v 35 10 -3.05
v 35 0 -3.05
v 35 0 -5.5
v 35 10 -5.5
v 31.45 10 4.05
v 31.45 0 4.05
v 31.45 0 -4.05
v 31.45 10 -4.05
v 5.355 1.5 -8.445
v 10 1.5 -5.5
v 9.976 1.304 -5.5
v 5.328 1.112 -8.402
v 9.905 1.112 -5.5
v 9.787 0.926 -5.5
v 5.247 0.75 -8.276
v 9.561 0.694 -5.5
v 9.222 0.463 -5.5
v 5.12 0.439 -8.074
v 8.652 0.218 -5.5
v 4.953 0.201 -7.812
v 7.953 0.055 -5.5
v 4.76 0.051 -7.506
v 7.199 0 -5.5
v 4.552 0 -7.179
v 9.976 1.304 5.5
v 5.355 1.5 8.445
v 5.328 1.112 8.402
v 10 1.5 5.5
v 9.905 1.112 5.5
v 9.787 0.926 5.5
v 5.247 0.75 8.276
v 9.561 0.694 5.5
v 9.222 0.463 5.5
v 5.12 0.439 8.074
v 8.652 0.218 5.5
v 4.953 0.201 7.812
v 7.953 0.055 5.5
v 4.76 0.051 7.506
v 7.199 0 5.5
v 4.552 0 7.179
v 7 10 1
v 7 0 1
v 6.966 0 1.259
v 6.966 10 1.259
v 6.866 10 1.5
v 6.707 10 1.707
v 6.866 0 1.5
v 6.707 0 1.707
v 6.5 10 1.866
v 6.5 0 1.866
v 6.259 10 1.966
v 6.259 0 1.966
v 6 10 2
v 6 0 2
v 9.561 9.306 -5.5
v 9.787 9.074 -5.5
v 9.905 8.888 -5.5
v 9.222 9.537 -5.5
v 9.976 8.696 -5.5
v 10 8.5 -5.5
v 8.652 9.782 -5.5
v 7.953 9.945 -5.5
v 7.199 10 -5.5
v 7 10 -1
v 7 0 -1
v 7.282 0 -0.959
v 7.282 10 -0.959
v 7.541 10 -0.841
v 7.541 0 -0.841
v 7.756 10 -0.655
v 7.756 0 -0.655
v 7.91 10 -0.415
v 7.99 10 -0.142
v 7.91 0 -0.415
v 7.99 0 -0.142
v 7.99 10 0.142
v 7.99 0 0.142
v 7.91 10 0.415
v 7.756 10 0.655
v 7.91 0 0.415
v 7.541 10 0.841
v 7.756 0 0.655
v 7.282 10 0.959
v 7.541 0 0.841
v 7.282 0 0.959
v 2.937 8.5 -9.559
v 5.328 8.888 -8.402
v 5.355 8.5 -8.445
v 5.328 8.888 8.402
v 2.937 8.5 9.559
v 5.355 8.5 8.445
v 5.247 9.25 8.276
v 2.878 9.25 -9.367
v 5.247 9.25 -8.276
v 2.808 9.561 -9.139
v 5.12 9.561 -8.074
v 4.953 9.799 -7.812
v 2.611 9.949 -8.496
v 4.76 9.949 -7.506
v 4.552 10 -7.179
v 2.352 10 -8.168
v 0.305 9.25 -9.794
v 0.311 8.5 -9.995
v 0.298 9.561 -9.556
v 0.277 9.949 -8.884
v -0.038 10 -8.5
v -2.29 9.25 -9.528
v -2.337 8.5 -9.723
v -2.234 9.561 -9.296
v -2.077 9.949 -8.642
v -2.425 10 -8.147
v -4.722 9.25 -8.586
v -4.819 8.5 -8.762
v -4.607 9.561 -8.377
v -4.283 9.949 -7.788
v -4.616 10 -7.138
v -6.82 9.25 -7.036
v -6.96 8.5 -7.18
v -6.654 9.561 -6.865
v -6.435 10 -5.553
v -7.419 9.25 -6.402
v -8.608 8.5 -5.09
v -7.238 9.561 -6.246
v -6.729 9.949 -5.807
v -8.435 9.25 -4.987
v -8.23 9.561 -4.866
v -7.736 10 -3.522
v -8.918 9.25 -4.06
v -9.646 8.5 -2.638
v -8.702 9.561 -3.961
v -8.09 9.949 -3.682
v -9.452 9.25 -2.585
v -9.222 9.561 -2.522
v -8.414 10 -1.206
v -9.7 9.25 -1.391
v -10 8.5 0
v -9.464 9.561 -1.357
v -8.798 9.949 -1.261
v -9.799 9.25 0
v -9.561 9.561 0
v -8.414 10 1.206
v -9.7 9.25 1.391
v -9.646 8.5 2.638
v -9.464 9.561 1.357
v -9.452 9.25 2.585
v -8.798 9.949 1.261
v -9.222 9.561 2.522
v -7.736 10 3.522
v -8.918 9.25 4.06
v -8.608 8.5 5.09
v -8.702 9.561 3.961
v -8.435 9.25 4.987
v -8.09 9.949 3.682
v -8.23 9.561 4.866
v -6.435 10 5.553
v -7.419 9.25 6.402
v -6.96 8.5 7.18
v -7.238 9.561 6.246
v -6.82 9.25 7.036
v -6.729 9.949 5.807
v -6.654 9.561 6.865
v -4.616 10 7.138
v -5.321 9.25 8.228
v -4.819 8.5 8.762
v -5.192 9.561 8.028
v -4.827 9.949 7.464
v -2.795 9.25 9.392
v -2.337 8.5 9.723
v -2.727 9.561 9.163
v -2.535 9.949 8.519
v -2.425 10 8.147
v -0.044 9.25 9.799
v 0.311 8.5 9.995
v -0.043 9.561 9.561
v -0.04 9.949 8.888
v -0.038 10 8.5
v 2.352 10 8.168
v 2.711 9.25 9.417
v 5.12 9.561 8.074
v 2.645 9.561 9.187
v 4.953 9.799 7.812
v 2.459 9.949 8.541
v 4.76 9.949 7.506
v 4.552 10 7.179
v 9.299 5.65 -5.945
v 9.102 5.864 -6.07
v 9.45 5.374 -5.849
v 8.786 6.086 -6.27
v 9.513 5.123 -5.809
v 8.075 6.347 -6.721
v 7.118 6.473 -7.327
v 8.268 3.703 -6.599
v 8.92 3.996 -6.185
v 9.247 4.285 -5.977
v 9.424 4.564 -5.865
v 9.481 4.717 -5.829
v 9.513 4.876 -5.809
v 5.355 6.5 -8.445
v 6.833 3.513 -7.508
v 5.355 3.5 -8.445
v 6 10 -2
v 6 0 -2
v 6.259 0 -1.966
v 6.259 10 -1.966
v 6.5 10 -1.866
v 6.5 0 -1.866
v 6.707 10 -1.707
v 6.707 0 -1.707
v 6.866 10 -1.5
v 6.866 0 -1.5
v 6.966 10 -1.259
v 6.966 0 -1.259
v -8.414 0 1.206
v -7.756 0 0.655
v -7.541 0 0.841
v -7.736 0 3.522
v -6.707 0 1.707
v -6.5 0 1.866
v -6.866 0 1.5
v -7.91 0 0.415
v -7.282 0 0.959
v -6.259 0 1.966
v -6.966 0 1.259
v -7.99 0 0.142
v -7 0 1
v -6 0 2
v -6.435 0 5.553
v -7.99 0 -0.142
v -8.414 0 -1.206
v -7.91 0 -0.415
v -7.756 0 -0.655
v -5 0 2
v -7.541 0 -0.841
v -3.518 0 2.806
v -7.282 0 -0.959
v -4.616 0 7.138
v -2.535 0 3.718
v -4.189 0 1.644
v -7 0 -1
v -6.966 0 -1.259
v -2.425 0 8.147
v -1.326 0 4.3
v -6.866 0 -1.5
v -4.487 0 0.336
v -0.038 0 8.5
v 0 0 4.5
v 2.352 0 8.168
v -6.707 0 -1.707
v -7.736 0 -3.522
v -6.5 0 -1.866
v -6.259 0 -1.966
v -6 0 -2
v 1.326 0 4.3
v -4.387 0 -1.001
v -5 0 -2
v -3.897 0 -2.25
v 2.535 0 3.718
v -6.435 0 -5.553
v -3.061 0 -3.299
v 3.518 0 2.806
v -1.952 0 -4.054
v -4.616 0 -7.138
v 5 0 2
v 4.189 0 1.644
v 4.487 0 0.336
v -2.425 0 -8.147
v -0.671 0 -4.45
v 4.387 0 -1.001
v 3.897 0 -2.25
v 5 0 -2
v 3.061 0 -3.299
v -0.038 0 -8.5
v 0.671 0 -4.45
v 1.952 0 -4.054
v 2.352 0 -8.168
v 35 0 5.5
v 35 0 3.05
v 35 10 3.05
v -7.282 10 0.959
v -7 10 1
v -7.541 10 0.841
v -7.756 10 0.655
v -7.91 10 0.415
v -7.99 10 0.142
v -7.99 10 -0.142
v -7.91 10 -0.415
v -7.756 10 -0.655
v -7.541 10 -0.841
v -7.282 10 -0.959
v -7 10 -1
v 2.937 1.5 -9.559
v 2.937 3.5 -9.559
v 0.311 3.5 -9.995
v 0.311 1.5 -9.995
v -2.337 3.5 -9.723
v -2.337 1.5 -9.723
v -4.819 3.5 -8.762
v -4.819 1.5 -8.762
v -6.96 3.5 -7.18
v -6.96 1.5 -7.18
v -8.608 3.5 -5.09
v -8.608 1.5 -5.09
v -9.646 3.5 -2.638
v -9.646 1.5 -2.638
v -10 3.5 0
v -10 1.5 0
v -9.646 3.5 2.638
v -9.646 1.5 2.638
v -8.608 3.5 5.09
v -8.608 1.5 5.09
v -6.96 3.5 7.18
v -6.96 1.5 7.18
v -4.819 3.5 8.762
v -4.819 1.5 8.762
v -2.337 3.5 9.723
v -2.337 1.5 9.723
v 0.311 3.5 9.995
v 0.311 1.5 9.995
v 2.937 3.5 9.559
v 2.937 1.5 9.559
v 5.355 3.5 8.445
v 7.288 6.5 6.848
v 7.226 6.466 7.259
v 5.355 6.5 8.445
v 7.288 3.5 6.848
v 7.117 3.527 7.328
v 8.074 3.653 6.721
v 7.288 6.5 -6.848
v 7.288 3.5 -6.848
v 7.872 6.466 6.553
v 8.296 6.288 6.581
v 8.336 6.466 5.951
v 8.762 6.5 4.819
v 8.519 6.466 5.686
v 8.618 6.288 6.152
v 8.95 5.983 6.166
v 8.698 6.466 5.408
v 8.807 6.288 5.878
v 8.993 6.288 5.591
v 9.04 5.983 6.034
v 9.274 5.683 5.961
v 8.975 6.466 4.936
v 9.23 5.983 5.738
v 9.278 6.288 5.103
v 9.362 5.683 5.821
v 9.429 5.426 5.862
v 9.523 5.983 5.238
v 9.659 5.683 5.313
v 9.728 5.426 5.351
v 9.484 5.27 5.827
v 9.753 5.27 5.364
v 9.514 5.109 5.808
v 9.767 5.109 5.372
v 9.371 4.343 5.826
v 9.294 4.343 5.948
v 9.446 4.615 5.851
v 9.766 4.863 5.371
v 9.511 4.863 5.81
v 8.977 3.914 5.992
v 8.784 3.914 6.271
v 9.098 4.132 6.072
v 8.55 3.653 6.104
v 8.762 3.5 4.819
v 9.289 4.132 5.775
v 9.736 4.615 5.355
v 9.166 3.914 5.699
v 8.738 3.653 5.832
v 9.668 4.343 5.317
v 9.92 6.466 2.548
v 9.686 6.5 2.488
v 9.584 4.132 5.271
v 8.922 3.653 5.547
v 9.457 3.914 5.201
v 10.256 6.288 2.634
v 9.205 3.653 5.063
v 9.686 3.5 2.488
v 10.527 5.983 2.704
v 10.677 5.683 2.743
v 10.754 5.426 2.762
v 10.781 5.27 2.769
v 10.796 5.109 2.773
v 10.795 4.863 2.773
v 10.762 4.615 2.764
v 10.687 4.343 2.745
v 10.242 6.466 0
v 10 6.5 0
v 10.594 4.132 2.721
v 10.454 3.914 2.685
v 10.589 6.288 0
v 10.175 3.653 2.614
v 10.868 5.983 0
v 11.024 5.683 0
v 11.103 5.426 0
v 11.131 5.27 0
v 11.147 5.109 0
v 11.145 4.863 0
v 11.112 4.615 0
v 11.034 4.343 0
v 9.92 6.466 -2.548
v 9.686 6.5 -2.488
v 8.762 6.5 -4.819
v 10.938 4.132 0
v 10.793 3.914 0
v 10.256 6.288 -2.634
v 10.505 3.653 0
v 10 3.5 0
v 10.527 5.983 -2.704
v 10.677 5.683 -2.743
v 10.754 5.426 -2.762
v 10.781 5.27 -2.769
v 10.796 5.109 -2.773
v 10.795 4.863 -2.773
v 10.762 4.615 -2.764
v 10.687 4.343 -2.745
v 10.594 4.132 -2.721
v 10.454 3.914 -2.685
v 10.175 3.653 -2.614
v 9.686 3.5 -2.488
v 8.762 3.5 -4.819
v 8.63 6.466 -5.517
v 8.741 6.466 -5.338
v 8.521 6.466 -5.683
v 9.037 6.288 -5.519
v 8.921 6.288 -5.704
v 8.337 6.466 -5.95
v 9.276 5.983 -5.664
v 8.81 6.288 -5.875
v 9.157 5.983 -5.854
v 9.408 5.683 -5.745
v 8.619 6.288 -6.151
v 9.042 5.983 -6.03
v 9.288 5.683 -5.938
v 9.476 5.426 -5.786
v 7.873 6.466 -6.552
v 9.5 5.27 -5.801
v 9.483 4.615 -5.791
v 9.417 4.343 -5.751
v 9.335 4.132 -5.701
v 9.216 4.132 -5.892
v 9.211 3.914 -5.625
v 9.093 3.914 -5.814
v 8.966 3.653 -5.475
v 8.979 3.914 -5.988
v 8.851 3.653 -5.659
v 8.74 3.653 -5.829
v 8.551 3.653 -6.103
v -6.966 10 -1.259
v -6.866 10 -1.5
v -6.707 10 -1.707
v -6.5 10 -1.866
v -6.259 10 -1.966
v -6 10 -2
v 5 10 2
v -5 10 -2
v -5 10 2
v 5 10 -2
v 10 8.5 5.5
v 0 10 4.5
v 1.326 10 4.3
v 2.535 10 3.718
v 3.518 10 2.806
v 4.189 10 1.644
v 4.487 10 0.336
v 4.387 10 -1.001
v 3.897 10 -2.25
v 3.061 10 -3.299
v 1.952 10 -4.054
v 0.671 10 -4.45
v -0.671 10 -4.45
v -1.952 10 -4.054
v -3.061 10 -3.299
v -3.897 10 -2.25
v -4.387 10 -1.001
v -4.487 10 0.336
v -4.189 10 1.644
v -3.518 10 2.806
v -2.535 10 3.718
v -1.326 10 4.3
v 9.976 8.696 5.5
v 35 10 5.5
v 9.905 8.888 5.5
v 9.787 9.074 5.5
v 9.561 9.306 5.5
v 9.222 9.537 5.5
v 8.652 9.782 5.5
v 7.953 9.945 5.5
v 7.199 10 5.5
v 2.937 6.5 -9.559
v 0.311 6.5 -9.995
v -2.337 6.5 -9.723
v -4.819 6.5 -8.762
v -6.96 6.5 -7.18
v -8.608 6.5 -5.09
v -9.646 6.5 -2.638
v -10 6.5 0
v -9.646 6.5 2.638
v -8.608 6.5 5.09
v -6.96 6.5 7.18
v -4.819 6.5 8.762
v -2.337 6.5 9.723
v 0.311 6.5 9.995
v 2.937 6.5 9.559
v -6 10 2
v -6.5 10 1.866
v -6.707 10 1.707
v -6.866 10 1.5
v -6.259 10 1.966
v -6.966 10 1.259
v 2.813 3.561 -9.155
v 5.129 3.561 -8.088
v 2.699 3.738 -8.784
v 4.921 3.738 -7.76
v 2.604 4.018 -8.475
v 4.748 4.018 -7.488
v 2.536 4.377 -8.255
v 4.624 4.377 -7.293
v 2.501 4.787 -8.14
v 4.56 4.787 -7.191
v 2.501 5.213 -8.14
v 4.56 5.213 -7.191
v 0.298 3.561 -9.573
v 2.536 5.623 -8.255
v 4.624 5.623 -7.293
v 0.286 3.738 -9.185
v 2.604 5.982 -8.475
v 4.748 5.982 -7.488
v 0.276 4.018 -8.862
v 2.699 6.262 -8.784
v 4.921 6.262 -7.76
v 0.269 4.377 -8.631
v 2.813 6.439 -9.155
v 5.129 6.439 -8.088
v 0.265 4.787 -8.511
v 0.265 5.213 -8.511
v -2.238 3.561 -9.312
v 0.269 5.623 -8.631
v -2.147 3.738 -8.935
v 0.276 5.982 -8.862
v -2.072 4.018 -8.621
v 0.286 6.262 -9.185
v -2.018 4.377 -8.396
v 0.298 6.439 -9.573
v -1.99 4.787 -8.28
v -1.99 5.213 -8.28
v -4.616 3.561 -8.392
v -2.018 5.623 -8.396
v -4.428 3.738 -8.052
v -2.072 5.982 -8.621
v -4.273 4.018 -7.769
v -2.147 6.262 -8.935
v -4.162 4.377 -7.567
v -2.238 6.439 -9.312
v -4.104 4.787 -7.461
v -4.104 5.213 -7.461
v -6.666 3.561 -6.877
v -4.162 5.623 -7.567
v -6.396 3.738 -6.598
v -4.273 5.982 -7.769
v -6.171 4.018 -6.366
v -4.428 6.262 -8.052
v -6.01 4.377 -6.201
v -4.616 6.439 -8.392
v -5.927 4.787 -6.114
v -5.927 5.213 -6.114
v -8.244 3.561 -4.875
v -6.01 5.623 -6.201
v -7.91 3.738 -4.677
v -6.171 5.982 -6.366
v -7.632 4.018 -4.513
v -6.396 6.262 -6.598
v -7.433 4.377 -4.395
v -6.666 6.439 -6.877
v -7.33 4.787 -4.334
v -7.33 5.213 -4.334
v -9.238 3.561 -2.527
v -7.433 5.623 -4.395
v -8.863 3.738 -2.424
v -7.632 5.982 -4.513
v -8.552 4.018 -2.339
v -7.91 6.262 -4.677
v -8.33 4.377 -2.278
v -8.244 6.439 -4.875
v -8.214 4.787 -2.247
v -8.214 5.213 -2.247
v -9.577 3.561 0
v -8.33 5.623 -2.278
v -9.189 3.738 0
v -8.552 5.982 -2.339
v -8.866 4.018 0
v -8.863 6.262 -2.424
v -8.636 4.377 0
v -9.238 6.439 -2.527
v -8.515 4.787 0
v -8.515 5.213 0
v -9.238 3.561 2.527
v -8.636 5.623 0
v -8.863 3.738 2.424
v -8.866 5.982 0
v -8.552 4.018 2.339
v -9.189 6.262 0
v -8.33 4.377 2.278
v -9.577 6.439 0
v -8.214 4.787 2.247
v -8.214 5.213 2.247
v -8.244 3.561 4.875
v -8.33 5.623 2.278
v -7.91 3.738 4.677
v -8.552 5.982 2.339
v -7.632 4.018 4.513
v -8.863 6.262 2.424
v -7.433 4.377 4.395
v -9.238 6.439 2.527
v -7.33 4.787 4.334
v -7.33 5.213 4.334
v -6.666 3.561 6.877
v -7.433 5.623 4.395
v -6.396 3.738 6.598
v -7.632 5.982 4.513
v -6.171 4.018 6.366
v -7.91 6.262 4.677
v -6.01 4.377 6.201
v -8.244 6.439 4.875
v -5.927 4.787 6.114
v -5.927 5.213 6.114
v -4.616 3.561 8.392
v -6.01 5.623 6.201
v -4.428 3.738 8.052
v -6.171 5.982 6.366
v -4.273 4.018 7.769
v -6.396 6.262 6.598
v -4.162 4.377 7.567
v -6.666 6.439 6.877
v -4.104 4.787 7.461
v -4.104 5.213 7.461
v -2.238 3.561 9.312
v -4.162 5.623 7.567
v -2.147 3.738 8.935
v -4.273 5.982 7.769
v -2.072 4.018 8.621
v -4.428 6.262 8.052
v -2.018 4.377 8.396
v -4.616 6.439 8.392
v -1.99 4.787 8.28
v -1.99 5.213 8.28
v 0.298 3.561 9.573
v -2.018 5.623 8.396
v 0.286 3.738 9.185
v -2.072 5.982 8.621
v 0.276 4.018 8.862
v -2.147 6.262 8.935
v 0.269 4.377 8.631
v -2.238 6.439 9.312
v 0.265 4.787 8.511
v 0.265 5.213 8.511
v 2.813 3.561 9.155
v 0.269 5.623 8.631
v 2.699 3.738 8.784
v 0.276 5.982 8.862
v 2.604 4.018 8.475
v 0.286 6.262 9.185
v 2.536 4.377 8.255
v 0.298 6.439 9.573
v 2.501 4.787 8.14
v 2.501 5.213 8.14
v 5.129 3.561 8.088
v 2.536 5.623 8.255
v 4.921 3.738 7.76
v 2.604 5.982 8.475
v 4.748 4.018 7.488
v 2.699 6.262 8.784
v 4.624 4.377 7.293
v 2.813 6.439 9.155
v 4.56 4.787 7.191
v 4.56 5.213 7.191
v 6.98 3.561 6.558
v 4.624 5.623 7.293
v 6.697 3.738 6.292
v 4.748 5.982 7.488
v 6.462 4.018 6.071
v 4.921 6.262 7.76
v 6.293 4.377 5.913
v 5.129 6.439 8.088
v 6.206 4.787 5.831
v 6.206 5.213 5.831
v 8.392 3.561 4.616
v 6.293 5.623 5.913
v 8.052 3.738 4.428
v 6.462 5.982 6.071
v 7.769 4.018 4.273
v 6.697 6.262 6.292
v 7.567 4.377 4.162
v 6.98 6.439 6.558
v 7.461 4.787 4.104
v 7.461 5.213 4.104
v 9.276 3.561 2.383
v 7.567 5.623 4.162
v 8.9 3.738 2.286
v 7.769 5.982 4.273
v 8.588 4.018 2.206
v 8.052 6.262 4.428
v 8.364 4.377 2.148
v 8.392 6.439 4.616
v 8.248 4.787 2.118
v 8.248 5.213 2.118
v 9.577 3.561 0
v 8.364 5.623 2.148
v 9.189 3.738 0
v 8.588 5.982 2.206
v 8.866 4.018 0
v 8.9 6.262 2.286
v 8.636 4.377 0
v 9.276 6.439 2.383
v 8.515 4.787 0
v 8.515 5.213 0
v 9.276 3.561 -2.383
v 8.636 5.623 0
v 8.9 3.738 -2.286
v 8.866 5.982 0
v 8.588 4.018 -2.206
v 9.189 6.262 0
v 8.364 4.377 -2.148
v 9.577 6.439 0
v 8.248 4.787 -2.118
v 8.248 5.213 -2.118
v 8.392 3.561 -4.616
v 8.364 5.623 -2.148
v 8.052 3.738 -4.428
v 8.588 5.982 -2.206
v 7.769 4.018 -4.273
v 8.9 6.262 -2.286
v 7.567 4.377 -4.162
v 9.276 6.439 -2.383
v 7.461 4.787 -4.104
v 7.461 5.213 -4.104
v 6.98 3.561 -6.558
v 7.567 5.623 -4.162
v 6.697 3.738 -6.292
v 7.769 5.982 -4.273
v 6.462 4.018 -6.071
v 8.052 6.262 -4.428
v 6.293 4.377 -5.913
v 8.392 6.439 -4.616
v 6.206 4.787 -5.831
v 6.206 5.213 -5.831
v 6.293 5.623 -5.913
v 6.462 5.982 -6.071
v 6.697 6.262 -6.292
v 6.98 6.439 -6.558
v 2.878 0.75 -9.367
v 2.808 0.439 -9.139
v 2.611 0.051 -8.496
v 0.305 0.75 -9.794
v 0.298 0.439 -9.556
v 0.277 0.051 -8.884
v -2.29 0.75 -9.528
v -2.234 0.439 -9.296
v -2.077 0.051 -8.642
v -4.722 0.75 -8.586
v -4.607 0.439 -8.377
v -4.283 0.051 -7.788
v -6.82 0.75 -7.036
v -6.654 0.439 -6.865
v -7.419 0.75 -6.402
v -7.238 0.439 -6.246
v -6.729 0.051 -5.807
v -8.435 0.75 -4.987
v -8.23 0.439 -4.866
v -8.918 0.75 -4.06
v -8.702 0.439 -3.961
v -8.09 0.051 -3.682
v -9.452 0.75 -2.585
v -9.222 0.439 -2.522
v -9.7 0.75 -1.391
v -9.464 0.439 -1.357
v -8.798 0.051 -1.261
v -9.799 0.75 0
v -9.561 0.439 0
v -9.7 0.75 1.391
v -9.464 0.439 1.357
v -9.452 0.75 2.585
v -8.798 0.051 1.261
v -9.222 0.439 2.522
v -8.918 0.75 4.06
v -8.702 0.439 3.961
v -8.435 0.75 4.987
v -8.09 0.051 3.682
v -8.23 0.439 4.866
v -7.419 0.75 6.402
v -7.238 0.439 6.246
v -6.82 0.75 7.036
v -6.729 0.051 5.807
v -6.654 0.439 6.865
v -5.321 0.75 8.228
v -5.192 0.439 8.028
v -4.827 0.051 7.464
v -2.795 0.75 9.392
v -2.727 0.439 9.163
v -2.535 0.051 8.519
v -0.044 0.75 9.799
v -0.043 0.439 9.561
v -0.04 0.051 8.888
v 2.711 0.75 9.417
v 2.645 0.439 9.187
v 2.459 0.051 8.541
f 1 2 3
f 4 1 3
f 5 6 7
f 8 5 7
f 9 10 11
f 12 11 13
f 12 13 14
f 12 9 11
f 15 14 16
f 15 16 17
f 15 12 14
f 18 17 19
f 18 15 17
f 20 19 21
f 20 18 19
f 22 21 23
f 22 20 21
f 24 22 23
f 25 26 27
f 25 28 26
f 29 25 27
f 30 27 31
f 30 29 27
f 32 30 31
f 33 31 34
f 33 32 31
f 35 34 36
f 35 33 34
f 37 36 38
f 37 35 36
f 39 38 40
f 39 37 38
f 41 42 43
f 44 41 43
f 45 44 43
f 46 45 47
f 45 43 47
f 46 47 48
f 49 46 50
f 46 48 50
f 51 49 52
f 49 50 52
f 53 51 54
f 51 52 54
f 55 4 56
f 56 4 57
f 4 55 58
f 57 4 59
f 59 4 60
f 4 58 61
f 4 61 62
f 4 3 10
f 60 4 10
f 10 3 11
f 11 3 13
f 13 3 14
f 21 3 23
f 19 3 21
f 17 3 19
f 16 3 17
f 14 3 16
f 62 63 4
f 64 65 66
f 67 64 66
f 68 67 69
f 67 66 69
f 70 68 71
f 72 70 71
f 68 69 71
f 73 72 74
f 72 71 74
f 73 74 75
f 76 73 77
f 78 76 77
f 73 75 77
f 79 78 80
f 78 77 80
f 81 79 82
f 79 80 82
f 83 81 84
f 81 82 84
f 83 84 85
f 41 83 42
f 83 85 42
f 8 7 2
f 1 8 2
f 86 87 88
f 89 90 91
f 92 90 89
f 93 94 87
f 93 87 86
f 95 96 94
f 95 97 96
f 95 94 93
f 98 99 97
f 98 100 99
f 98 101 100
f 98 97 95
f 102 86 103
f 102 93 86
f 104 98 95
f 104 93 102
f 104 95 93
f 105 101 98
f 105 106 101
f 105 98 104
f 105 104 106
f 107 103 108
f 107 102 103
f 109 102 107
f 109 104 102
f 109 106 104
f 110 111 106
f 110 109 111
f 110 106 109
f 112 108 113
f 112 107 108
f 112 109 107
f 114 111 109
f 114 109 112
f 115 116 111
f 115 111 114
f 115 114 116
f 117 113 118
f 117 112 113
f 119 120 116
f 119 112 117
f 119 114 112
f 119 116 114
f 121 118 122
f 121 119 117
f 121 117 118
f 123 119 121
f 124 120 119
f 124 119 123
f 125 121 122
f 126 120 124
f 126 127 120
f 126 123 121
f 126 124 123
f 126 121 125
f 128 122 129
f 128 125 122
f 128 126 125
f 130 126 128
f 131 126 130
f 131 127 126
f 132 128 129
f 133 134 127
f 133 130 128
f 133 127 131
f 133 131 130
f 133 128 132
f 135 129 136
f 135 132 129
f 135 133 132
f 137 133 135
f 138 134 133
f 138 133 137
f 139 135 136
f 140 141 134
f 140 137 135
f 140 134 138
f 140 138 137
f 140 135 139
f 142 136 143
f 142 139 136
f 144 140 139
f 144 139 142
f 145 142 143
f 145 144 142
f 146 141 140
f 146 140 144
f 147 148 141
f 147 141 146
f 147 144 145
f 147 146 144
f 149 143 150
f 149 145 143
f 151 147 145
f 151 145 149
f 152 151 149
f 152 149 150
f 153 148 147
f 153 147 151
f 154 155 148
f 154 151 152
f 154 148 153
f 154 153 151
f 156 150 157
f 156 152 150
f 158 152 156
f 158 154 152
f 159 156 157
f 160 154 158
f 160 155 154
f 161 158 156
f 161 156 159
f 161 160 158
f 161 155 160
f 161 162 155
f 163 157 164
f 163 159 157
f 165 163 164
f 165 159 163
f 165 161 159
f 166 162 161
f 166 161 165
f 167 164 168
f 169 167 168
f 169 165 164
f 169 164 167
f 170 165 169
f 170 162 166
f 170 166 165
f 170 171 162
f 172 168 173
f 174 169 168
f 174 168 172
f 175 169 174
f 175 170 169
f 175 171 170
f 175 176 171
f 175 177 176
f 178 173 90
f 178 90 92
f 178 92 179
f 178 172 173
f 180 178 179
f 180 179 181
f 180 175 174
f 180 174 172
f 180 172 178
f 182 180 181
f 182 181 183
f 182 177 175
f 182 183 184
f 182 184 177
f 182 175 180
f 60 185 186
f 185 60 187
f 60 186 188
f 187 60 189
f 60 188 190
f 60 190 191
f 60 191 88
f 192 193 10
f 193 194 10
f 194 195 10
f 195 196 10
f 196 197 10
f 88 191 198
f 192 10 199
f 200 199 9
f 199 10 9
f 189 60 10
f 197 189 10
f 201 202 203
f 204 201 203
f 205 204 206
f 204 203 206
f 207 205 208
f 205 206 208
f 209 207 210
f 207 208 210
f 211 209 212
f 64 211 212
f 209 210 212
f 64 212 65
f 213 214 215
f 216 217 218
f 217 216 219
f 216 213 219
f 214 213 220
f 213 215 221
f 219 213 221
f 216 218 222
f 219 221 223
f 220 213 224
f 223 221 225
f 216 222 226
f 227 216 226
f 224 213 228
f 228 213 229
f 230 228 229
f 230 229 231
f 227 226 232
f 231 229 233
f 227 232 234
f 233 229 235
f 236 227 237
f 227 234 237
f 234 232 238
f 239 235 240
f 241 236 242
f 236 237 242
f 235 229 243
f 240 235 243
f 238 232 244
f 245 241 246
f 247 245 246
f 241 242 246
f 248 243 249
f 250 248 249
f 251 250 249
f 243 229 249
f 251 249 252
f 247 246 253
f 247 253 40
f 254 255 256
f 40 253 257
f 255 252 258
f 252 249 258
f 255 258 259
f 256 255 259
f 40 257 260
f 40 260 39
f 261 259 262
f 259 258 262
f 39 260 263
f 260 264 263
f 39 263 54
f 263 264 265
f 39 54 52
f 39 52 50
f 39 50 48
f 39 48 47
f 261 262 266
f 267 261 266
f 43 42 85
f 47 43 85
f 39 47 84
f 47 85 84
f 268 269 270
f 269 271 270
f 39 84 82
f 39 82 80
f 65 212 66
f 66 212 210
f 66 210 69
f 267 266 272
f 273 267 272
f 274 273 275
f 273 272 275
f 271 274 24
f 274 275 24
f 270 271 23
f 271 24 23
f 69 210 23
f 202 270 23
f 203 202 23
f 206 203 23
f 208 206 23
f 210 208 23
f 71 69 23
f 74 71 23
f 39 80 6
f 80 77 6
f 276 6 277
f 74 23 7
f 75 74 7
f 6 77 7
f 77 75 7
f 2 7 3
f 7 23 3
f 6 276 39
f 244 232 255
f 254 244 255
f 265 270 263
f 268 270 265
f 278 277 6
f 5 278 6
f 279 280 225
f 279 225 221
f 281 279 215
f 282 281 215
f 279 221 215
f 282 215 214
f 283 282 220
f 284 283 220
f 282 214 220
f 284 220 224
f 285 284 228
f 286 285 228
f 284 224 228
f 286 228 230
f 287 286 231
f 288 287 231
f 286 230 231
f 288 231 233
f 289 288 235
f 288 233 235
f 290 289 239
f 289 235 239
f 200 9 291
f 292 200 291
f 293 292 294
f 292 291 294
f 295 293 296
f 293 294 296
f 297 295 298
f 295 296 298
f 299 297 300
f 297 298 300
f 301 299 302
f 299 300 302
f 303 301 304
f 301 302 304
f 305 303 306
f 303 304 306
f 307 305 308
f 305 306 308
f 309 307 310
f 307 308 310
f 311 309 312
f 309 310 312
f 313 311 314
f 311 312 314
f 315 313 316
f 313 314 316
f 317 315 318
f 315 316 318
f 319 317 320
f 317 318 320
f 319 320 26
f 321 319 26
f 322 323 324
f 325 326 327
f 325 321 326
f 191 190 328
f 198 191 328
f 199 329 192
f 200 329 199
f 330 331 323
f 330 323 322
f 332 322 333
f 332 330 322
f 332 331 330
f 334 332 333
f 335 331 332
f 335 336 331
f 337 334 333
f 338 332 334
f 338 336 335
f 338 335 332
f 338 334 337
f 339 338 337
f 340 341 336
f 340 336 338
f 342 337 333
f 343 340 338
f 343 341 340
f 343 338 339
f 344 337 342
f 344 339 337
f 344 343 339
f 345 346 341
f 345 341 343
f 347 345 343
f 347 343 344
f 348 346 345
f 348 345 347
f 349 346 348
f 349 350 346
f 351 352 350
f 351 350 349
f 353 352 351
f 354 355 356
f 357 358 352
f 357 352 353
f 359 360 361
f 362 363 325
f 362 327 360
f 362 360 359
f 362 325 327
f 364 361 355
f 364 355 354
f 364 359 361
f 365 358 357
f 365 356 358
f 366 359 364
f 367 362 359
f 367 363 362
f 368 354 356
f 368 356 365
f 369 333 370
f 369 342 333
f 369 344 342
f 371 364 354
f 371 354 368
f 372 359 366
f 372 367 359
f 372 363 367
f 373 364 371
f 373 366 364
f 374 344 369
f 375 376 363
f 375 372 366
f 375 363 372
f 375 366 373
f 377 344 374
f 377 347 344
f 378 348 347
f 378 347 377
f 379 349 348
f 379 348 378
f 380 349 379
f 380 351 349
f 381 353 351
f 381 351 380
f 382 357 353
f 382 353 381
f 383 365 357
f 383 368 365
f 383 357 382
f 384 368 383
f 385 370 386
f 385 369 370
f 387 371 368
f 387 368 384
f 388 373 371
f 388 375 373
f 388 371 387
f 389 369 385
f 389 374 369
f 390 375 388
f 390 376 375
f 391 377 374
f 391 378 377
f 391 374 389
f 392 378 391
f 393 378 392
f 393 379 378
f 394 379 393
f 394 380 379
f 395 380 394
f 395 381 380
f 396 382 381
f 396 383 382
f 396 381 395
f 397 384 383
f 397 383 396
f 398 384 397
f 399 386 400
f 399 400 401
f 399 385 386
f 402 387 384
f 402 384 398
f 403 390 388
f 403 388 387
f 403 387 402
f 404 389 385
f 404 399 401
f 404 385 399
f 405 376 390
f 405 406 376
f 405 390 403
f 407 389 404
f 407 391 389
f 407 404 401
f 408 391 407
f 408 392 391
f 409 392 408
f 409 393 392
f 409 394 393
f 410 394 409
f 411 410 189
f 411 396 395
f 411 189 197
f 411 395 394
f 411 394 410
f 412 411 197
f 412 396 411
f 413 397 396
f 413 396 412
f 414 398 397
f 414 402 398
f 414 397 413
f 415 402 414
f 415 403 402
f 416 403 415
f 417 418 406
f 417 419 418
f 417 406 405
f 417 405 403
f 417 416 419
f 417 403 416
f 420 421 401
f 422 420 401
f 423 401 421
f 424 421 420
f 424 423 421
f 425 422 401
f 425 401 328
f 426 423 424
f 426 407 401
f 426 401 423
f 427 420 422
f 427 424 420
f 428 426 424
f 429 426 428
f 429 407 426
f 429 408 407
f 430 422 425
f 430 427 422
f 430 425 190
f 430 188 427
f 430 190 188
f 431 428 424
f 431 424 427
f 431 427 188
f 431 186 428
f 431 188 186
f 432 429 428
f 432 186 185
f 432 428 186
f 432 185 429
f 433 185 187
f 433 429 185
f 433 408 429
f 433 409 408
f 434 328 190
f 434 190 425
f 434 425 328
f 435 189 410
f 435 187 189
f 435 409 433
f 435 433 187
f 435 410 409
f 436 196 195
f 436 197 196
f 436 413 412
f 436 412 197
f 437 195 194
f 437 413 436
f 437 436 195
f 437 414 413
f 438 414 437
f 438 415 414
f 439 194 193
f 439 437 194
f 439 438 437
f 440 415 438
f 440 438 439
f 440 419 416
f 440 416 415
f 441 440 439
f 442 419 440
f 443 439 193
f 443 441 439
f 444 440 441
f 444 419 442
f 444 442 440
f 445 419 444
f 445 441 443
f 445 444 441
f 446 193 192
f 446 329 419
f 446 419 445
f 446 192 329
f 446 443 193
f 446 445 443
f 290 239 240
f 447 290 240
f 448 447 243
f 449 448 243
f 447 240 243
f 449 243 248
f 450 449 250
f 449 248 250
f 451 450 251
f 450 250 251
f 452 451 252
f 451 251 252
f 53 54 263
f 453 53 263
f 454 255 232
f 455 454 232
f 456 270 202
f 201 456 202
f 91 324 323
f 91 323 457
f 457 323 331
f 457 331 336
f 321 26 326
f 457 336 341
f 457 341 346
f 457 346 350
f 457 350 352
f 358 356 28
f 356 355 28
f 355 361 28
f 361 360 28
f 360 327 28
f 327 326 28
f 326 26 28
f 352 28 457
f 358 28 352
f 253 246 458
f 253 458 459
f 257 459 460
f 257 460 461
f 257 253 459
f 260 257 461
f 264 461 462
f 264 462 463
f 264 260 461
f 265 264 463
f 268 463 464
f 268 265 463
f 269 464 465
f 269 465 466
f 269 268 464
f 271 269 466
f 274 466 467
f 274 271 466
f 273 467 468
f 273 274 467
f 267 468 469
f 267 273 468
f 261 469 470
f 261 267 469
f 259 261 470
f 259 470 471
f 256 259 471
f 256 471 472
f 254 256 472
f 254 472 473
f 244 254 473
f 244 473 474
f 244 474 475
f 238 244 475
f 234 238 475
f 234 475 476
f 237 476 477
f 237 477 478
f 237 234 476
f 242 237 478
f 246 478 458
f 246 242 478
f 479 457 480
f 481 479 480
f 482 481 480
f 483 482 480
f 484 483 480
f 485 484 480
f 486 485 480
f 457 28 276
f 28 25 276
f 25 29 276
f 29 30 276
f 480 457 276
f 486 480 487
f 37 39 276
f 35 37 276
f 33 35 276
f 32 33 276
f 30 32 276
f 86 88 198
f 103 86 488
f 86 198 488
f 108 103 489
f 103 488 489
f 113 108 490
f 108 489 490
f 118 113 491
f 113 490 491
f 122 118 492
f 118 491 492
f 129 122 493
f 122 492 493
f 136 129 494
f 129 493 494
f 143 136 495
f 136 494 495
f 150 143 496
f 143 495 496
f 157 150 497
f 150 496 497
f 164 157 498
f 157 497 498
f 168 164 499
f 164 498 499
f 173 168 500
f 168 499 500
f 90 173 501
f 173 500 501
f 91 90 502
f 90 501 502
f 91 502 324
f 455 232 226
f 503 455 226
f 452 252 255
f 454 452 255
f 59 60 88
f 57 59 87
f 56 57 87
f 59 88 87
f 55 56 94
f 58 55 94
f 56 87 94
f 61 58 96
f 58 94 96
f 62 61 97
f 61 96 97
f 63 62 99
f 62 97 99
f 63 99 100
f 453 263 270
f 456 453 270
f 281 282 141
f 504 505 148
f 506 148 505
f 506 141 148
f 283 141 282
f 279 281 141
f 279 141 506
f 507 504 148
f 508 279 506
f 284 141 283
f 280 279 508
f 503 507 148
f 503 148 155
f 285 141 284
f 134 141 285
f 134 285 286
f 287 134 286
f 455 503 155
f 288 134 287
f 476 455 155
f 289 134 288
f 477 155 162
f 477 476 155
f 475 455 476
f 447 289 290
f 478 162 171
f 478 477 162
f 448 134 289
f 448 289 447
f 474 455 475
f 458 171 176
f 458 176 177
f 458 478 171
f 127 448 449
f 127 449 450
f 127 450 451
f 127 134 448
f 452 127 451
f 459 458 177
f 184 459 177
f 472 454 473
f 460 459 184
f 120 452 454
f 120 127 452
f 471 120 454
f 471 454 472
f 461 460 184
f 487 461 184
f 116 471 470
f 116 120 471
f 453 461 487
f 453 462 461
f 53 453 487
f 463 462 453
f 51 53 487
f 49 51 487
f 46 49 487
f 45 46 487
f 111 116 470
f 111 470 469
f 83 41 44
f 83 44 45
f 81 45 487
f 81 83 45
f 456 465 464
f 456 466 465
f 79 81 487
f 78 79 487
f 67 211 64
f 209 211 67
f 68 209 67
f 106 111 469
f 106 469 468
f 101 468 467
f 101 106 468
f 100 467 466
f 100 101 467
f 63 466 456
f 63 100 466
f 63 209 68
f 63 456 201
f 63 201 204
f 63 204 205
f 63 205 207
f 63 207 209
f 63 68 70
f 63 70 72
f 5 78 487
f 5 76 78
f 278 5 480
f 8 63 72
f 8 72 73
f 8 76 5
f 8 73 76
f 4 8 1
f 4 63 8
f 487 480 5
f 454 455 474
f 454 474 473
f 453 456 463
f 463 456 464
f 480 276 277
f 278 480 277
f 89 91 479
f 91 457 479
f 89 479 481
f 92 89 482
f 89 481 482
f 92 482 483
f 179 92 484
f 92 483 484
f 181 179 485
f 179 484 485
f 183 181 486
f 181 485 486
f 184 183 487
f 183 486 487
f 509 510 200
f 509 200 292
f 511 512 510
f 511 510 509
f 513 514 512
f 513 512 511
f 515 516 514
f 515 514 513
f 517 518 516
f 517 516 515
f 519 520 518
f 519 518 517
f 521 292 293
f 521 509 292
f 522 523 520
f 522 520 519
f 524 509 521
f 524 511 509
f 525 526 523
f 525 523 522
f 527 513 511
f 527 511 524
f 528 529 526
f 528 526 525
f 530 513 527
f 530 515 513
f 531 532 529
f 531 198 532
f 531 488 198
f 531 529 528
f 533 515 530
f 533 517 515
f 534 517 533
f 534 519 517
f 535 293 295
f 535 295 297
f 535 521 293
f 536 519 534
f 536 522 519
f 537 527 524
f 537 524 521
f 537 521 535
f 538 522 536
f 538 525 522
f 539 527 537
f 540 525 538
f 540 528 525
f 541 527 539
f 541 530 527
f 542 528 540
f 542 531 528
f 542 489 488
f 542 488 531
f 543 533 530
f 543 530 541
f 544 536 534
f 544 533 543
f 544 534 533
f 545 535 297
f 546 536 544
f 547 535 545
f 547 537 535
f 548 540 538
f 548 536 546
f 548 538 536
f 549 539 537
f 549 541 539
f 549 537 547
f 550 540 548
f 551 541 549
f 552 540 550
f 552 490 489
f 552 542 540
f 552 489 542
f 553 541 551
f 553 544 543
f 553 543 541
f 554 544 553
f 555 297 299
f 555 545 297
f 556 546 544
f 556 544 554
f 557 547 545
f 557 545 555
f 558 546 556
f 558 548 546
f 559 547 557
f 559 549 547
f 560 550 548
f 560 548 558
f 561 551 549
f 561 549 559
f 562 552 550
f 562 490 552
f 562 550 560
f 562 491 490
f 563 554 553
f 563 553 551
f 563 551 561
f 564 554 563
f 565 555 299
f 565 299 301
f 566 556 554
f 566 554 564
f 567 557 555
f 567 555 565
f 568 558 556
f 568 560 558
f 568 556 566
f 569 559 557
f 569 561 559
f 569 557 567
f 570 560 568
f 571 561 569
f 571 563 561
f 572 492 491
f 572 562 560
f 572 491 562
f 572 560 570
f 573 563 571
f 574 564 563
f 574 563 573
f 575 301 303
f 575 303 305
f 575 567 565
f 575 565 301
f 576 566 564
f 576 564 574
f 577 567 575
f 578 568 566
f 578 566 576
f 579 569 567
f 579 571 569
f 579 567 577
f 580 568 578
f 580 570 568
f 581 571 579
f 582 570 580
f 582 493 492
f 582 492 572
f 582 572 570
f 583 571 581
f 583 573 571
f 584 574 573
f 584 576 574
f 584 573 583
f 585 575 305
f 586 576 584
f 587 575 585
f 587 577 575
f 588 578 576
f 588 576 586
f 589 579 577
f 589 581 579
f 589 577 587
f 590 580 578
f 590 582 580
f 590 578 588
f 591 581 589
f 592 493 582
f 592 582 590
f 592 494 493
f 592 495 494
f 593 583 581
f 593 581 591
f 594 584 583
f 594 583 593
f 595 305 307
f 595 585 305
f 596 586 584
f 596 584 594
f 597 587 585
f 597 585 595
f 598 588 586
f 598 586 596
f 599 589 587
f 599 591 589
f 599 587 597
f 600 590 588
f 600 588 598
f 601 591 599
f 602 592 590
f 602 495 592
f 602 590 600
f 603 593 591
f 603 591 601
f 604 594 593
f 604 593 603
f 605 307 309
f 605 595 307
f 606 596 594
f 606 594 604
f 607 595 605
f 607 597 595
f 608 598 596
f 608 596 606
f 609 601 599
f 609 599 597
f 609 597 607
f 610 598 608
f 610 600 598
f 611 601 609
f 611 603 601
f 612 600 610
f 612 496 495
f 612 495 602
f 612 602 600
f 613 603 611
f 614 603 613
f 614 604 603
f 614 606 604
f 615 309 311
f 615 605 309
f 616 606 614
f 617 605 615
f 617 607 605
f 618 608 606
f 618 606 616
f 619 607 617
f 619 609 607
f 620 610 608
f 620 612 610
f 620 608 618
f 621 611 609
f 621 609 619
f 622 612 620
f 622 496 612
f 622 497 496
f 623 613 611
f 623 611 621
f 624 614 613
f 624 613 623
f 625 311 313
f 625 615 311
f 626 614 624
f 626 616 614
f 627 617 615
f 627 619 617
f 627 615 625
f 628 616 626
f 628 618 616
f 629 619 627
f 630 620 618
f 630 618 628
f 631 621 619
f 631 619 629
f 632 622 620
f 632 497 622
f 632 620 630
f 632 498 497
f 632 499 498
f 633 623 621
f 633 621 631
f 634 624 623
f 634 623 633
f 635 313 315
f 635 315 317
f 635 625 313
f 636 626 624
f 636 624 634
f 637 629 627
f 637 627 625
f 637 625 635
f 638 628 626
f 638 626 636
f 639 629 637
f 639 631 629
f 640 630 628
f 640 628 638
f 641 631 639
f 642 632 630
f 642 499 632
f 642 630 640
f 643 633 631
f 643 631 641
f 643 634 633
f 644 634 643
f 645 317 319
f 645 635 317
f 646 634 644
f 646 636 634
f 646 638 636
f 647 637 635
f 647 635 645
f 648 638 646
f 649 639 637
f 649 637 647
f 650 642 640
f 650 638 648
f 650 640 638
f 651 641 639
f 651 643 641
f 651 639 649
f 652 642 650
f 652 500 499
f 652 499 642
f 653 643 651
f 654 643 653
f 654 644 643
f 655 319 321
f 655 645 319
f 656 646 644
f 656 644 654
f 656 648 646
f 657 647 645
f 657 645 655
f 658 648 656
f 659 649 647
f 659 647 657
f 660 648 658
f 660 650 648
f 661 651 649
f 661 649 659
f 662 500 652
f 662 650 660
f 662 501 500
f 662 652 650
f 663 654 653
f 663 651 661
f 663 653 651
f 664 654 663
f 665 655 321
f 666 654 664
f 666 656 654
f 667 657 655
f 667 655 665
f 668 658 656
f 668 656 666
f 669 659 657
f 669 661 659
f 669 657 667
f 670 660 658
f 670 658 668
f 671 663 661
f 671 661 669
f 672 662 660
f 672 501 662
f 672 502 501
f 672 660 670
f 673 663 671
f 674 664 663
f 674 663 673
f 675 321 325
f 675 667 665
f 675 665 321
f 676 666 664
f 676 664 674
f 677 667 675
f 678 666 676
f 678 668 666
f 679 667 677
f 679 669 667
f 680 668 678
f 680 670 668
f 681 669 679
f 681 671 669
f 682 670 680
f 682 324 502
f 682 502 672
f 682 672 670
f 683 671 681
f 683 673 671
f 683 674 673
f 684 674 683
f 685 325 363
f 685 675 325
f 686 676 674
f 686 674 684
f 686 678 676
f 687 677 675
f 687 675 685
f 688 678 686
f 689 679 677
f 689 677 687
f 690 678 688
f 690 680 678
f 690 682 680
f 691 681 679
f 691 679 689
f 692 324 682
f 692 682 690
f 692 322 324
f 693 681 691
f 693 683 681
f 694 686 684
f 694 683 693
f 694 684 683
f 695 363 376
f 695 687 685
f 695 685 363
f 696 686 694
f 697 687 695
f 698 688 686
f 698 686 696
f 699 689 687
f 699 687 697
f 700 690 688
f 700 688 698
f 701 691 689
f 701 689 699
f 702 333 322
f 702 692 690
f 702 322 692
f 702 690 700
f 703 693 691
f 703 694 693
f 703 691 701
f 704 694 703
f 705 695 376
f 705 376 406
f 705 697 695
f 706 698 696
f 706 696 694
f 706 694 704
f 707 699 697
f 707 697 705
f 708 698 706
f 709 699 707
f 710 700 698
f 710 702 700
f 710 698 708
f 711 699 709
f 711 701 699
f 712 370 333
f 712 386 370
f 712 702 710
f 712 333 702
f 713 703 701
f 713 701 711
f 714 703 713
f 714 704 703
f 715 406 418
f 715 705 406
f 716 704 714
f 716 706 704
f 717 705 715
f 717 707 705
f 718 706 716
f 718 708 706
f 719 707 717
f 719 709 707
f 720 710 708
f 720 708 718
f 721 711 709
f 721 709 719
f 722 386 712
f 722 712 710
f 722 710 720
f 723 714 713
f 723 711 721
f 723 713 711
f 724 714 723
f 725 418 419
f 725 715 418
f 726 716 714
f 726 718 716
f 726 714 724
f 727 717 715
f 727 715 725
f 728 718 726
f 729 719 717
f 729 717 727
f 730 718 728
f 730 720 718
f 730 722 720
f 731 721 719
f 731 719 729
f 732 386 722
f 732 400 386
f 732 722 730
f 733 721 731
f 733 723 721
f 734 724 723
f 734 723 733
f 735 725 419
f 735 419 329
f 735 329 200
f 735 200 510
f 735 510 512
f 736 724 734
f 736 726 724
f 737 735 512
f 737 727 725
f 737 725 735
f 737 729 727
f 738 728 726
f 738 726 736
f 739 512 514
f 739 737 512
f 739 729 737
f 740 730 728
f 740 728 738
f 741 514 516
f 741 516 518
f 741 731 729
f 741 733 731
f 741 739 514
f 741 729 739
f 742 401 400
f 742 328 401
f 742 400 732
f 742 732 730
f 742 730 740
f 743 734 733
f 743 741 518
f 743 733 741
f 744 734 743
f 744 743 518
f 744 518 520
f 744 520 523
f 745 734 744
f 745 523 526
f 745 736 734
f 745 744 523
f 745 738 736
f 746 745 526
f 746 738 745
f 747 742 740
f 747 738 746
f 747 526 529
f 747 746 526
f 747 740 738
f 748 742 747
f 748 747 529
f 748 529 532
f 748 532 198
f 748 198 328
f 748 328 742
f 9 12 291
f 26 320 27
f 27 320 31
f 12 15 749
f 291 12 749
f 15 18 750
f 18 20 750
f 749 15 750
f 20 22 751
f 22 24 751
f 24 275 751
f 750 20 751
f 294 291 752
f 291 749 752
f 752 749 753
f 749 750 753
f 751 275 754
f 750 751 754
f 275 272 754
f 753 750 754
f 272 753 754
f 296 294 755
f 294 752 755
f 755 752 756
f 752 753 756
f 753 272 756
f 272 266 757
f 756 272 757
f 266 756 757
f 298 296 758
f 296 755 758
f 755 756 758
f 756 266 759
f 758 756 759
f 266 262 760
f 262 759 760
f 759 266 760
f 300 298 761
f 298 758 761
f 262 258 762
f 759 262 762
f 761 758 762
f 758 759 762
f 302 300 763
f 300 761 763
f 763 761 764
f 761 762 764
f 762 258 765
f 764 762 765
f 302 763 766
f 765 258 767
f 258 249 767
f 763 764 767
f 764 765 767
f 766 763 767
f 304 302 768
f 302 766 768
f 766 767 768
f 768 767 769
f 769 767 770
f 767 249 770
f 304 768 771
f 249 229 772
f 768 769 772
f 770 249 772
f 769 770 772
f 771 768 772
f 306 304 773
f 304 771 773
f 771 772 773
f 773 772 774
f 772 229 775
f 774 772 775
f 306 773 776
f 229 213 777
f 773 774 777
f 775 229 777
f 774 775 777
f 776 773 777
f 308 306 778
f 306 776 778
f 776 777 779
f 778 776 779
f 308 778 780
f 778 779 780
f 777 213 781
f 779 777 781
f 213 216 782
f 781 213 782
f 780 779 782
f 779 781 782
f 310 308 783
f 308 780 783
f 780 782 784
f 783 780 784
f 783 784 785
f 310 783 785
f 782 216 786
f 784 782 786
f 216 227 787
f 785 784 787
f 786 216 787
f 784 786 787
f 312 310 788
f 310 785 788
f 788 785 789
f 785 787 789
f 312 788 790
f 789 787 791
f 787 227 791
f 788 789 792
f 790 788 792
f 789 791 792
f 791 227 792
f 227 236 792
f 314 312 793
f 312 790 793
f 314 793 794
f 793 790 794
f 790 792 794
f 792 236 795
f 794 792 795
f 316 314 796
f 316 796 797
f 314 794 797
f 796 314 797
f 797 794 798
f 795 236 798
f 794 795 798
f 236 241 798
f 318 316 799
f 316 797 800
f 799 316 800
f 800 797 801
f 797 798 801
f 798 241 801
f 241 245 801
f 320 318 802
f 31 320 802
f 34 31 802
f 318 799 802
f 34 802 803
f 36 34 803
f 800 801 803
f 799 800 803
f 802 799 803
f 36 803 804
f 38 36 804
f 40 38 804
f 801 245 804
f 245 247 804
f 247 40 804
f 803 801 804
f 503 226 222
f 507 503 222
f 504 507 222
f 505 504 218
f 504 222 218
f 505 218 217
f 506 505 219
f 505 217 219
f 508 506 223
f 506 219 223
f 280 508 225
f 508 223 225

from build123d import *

# Parameters (mm, degrees)
SKETCH1_R           = 4.5
BOSS_EXTRUDE2_DEPTH = 10
FILLET2_R           = 1.5


with BuildPart() as part:
    # Sketch1 → Boss-Extrude2 (new body)
    with BuildSketch(Plane(origin=(0, 0, 0), x_dir=(1, 0, 0), z_dir=(0, 1, 0))):
        with BuildLine():
            Line((35, 5.500000000000003), (10, 5.500000000000003))
            Line((10, 5.500000000000003), (5.355086372360837, 8.445297504798466))
            ThreePointArc((5.355086372360837, 8.445297504798466), (-10, 1.11e-14), (5.355086372360817, -8.445297504798482))
            Line((5.355086372360817, -8.445297504798482), (10, -5.499999999999997))
            Line((10, -5.499999999999997), (34.99999999999999, -5.499999999999997))
            Line((34.99999999999999, -5.499999999999997), (35, -3.05))
            Line((35, -3.05), (31.449999999999992, -4.050000000000006))
            Line((31.449999999999992, -4.050000000000006), (31.450000000000006, 4.049999999999974))
            Line((31.450000000000006, 4.049999999999973), (35, 3.05))
            Line((35, 3.05), (35, 5.500000000000003))
        make_face()
        with BuildLine():
            Line((-5, 2), (-4.999999999999999, -2))
            Line((-4.999999999999999, -2), (-5.999999999999992, -2))
            ThreePointArc((-5.999999999999992, -1.9999999999999998), (-6.707106781186546, -1.7071067811865475), (-6.999999999999999, -0.9999999999999932))
            ThreePointArc((-6.999999999999999, -1.0000000000000002), (-7.999999999999999, -7.6e-16), (-7, 0.9999999999999993))
            ThreePointArc((-7, 0.9999999999999923), (-6.707106781186547, 1.707106781186547), (-5.999999999999993, 2))
            Line((-5.999999999999993, 1.9999999999999996), (-5, 2))
        make_face(mode=Mode.SUBTRACT)
        with Locations(Location((0, 0, 0), (0, 0, 270))):
            Circle(SKETCH1_R, mode=Mode.SUBTRACT)
        with BuildLine():
            Line((4.999999999999999, -2), (5, 2))
            Line((5, 2), (5.999999999999993, 1.9999999999999996))
            ThreePointArc((5.999999999999993, 1.9999999999999998), (6.707106781186548, 1.707106781186547), (7, 0.9999999999999923))
            ThreePointArc((7, 0.9999999999999993), (7.707106781186547, 0.7071067811865467), (7.999999999999999, -4.3e-16))
            ThreePointArc((7.999999999999999, -6.8e-16), (7.707106781186546, -0.707106781186548), (6.999999999999999, -1.0000000000000002))
            ThreePointArc((6.999999999999999, -0.9999999999999932), (6.707106781186546, -1.7071067811865475), (5.999999999999992, -1.9999999999999998))
            Line((5.999999999999992, -2), (4.999999999999999, -2))
        make_face(mode=Mode.SUBTRACT)
    extrude(amount=BOSS_EXTRUDE2_DEPTH)

    # Sketch4 → Cut-Revolve3 (revolve, cut)
    with BuildSketch(Plane(origin=(-6.666818896321271, 16.53530046448365, 0), x_dir=(0, 1, 0), z_dir=(0, 0, 1)), mode=Mode.PRIVATE) as cut_revolve3_sk:
        with BuildLine():
            ThreePointArc((-13.035300464483651, 3.333181103678728), (-11.535300464483651, 1.833181103678728), (-10.035300464483651, 3.333181103678728))
            add(Edge.make_bspline(
                [(-10.035300464483651, 3.333181103678728), (-10.035300464483651, 4.483181103678728), (-11.535300464483651, 4.483181103678728), (-13.035300464483651, 4.483181103678727), (-13.035300464483651, 3.333181103678728)],
                knots=[0, 0, 0, 1.5707963267948966, 1.5707963267948966, 3.141592653589793, 3.141592653589793, 3.141592653589793], degree=2, weights=[1, 0.7071067811865476, 1, 0.7071067811865476, 1]))
        make_face()
    revolve(cut_revolve3_sk.sketch.rotate(Axis((0, 0, 0), (0, 1, 0)), 237.621587486), axis=Axis((0, 0, 0), (0, 1, 0)), mode=Mode.SUBTRACT)

    # Fillet2
    fillet2_edges = [part.edges().sort_by_distance(p)[0] for p in [
        (7.677543186180419, 0, -6.972648752399234),
        (-10, 0, -1.11e-14),
        (7.677543186180419, 10, -6.972648752399234),
        (-10, 10, -1.11e-14),
        (7.677543186180408, 0, 6.972648752399239),
        (7.677543186180408, 10, 6.972648752399239),
    ]]
    fillet(fillet2_edges, radius=FILLET2_R)


solid = part.part
